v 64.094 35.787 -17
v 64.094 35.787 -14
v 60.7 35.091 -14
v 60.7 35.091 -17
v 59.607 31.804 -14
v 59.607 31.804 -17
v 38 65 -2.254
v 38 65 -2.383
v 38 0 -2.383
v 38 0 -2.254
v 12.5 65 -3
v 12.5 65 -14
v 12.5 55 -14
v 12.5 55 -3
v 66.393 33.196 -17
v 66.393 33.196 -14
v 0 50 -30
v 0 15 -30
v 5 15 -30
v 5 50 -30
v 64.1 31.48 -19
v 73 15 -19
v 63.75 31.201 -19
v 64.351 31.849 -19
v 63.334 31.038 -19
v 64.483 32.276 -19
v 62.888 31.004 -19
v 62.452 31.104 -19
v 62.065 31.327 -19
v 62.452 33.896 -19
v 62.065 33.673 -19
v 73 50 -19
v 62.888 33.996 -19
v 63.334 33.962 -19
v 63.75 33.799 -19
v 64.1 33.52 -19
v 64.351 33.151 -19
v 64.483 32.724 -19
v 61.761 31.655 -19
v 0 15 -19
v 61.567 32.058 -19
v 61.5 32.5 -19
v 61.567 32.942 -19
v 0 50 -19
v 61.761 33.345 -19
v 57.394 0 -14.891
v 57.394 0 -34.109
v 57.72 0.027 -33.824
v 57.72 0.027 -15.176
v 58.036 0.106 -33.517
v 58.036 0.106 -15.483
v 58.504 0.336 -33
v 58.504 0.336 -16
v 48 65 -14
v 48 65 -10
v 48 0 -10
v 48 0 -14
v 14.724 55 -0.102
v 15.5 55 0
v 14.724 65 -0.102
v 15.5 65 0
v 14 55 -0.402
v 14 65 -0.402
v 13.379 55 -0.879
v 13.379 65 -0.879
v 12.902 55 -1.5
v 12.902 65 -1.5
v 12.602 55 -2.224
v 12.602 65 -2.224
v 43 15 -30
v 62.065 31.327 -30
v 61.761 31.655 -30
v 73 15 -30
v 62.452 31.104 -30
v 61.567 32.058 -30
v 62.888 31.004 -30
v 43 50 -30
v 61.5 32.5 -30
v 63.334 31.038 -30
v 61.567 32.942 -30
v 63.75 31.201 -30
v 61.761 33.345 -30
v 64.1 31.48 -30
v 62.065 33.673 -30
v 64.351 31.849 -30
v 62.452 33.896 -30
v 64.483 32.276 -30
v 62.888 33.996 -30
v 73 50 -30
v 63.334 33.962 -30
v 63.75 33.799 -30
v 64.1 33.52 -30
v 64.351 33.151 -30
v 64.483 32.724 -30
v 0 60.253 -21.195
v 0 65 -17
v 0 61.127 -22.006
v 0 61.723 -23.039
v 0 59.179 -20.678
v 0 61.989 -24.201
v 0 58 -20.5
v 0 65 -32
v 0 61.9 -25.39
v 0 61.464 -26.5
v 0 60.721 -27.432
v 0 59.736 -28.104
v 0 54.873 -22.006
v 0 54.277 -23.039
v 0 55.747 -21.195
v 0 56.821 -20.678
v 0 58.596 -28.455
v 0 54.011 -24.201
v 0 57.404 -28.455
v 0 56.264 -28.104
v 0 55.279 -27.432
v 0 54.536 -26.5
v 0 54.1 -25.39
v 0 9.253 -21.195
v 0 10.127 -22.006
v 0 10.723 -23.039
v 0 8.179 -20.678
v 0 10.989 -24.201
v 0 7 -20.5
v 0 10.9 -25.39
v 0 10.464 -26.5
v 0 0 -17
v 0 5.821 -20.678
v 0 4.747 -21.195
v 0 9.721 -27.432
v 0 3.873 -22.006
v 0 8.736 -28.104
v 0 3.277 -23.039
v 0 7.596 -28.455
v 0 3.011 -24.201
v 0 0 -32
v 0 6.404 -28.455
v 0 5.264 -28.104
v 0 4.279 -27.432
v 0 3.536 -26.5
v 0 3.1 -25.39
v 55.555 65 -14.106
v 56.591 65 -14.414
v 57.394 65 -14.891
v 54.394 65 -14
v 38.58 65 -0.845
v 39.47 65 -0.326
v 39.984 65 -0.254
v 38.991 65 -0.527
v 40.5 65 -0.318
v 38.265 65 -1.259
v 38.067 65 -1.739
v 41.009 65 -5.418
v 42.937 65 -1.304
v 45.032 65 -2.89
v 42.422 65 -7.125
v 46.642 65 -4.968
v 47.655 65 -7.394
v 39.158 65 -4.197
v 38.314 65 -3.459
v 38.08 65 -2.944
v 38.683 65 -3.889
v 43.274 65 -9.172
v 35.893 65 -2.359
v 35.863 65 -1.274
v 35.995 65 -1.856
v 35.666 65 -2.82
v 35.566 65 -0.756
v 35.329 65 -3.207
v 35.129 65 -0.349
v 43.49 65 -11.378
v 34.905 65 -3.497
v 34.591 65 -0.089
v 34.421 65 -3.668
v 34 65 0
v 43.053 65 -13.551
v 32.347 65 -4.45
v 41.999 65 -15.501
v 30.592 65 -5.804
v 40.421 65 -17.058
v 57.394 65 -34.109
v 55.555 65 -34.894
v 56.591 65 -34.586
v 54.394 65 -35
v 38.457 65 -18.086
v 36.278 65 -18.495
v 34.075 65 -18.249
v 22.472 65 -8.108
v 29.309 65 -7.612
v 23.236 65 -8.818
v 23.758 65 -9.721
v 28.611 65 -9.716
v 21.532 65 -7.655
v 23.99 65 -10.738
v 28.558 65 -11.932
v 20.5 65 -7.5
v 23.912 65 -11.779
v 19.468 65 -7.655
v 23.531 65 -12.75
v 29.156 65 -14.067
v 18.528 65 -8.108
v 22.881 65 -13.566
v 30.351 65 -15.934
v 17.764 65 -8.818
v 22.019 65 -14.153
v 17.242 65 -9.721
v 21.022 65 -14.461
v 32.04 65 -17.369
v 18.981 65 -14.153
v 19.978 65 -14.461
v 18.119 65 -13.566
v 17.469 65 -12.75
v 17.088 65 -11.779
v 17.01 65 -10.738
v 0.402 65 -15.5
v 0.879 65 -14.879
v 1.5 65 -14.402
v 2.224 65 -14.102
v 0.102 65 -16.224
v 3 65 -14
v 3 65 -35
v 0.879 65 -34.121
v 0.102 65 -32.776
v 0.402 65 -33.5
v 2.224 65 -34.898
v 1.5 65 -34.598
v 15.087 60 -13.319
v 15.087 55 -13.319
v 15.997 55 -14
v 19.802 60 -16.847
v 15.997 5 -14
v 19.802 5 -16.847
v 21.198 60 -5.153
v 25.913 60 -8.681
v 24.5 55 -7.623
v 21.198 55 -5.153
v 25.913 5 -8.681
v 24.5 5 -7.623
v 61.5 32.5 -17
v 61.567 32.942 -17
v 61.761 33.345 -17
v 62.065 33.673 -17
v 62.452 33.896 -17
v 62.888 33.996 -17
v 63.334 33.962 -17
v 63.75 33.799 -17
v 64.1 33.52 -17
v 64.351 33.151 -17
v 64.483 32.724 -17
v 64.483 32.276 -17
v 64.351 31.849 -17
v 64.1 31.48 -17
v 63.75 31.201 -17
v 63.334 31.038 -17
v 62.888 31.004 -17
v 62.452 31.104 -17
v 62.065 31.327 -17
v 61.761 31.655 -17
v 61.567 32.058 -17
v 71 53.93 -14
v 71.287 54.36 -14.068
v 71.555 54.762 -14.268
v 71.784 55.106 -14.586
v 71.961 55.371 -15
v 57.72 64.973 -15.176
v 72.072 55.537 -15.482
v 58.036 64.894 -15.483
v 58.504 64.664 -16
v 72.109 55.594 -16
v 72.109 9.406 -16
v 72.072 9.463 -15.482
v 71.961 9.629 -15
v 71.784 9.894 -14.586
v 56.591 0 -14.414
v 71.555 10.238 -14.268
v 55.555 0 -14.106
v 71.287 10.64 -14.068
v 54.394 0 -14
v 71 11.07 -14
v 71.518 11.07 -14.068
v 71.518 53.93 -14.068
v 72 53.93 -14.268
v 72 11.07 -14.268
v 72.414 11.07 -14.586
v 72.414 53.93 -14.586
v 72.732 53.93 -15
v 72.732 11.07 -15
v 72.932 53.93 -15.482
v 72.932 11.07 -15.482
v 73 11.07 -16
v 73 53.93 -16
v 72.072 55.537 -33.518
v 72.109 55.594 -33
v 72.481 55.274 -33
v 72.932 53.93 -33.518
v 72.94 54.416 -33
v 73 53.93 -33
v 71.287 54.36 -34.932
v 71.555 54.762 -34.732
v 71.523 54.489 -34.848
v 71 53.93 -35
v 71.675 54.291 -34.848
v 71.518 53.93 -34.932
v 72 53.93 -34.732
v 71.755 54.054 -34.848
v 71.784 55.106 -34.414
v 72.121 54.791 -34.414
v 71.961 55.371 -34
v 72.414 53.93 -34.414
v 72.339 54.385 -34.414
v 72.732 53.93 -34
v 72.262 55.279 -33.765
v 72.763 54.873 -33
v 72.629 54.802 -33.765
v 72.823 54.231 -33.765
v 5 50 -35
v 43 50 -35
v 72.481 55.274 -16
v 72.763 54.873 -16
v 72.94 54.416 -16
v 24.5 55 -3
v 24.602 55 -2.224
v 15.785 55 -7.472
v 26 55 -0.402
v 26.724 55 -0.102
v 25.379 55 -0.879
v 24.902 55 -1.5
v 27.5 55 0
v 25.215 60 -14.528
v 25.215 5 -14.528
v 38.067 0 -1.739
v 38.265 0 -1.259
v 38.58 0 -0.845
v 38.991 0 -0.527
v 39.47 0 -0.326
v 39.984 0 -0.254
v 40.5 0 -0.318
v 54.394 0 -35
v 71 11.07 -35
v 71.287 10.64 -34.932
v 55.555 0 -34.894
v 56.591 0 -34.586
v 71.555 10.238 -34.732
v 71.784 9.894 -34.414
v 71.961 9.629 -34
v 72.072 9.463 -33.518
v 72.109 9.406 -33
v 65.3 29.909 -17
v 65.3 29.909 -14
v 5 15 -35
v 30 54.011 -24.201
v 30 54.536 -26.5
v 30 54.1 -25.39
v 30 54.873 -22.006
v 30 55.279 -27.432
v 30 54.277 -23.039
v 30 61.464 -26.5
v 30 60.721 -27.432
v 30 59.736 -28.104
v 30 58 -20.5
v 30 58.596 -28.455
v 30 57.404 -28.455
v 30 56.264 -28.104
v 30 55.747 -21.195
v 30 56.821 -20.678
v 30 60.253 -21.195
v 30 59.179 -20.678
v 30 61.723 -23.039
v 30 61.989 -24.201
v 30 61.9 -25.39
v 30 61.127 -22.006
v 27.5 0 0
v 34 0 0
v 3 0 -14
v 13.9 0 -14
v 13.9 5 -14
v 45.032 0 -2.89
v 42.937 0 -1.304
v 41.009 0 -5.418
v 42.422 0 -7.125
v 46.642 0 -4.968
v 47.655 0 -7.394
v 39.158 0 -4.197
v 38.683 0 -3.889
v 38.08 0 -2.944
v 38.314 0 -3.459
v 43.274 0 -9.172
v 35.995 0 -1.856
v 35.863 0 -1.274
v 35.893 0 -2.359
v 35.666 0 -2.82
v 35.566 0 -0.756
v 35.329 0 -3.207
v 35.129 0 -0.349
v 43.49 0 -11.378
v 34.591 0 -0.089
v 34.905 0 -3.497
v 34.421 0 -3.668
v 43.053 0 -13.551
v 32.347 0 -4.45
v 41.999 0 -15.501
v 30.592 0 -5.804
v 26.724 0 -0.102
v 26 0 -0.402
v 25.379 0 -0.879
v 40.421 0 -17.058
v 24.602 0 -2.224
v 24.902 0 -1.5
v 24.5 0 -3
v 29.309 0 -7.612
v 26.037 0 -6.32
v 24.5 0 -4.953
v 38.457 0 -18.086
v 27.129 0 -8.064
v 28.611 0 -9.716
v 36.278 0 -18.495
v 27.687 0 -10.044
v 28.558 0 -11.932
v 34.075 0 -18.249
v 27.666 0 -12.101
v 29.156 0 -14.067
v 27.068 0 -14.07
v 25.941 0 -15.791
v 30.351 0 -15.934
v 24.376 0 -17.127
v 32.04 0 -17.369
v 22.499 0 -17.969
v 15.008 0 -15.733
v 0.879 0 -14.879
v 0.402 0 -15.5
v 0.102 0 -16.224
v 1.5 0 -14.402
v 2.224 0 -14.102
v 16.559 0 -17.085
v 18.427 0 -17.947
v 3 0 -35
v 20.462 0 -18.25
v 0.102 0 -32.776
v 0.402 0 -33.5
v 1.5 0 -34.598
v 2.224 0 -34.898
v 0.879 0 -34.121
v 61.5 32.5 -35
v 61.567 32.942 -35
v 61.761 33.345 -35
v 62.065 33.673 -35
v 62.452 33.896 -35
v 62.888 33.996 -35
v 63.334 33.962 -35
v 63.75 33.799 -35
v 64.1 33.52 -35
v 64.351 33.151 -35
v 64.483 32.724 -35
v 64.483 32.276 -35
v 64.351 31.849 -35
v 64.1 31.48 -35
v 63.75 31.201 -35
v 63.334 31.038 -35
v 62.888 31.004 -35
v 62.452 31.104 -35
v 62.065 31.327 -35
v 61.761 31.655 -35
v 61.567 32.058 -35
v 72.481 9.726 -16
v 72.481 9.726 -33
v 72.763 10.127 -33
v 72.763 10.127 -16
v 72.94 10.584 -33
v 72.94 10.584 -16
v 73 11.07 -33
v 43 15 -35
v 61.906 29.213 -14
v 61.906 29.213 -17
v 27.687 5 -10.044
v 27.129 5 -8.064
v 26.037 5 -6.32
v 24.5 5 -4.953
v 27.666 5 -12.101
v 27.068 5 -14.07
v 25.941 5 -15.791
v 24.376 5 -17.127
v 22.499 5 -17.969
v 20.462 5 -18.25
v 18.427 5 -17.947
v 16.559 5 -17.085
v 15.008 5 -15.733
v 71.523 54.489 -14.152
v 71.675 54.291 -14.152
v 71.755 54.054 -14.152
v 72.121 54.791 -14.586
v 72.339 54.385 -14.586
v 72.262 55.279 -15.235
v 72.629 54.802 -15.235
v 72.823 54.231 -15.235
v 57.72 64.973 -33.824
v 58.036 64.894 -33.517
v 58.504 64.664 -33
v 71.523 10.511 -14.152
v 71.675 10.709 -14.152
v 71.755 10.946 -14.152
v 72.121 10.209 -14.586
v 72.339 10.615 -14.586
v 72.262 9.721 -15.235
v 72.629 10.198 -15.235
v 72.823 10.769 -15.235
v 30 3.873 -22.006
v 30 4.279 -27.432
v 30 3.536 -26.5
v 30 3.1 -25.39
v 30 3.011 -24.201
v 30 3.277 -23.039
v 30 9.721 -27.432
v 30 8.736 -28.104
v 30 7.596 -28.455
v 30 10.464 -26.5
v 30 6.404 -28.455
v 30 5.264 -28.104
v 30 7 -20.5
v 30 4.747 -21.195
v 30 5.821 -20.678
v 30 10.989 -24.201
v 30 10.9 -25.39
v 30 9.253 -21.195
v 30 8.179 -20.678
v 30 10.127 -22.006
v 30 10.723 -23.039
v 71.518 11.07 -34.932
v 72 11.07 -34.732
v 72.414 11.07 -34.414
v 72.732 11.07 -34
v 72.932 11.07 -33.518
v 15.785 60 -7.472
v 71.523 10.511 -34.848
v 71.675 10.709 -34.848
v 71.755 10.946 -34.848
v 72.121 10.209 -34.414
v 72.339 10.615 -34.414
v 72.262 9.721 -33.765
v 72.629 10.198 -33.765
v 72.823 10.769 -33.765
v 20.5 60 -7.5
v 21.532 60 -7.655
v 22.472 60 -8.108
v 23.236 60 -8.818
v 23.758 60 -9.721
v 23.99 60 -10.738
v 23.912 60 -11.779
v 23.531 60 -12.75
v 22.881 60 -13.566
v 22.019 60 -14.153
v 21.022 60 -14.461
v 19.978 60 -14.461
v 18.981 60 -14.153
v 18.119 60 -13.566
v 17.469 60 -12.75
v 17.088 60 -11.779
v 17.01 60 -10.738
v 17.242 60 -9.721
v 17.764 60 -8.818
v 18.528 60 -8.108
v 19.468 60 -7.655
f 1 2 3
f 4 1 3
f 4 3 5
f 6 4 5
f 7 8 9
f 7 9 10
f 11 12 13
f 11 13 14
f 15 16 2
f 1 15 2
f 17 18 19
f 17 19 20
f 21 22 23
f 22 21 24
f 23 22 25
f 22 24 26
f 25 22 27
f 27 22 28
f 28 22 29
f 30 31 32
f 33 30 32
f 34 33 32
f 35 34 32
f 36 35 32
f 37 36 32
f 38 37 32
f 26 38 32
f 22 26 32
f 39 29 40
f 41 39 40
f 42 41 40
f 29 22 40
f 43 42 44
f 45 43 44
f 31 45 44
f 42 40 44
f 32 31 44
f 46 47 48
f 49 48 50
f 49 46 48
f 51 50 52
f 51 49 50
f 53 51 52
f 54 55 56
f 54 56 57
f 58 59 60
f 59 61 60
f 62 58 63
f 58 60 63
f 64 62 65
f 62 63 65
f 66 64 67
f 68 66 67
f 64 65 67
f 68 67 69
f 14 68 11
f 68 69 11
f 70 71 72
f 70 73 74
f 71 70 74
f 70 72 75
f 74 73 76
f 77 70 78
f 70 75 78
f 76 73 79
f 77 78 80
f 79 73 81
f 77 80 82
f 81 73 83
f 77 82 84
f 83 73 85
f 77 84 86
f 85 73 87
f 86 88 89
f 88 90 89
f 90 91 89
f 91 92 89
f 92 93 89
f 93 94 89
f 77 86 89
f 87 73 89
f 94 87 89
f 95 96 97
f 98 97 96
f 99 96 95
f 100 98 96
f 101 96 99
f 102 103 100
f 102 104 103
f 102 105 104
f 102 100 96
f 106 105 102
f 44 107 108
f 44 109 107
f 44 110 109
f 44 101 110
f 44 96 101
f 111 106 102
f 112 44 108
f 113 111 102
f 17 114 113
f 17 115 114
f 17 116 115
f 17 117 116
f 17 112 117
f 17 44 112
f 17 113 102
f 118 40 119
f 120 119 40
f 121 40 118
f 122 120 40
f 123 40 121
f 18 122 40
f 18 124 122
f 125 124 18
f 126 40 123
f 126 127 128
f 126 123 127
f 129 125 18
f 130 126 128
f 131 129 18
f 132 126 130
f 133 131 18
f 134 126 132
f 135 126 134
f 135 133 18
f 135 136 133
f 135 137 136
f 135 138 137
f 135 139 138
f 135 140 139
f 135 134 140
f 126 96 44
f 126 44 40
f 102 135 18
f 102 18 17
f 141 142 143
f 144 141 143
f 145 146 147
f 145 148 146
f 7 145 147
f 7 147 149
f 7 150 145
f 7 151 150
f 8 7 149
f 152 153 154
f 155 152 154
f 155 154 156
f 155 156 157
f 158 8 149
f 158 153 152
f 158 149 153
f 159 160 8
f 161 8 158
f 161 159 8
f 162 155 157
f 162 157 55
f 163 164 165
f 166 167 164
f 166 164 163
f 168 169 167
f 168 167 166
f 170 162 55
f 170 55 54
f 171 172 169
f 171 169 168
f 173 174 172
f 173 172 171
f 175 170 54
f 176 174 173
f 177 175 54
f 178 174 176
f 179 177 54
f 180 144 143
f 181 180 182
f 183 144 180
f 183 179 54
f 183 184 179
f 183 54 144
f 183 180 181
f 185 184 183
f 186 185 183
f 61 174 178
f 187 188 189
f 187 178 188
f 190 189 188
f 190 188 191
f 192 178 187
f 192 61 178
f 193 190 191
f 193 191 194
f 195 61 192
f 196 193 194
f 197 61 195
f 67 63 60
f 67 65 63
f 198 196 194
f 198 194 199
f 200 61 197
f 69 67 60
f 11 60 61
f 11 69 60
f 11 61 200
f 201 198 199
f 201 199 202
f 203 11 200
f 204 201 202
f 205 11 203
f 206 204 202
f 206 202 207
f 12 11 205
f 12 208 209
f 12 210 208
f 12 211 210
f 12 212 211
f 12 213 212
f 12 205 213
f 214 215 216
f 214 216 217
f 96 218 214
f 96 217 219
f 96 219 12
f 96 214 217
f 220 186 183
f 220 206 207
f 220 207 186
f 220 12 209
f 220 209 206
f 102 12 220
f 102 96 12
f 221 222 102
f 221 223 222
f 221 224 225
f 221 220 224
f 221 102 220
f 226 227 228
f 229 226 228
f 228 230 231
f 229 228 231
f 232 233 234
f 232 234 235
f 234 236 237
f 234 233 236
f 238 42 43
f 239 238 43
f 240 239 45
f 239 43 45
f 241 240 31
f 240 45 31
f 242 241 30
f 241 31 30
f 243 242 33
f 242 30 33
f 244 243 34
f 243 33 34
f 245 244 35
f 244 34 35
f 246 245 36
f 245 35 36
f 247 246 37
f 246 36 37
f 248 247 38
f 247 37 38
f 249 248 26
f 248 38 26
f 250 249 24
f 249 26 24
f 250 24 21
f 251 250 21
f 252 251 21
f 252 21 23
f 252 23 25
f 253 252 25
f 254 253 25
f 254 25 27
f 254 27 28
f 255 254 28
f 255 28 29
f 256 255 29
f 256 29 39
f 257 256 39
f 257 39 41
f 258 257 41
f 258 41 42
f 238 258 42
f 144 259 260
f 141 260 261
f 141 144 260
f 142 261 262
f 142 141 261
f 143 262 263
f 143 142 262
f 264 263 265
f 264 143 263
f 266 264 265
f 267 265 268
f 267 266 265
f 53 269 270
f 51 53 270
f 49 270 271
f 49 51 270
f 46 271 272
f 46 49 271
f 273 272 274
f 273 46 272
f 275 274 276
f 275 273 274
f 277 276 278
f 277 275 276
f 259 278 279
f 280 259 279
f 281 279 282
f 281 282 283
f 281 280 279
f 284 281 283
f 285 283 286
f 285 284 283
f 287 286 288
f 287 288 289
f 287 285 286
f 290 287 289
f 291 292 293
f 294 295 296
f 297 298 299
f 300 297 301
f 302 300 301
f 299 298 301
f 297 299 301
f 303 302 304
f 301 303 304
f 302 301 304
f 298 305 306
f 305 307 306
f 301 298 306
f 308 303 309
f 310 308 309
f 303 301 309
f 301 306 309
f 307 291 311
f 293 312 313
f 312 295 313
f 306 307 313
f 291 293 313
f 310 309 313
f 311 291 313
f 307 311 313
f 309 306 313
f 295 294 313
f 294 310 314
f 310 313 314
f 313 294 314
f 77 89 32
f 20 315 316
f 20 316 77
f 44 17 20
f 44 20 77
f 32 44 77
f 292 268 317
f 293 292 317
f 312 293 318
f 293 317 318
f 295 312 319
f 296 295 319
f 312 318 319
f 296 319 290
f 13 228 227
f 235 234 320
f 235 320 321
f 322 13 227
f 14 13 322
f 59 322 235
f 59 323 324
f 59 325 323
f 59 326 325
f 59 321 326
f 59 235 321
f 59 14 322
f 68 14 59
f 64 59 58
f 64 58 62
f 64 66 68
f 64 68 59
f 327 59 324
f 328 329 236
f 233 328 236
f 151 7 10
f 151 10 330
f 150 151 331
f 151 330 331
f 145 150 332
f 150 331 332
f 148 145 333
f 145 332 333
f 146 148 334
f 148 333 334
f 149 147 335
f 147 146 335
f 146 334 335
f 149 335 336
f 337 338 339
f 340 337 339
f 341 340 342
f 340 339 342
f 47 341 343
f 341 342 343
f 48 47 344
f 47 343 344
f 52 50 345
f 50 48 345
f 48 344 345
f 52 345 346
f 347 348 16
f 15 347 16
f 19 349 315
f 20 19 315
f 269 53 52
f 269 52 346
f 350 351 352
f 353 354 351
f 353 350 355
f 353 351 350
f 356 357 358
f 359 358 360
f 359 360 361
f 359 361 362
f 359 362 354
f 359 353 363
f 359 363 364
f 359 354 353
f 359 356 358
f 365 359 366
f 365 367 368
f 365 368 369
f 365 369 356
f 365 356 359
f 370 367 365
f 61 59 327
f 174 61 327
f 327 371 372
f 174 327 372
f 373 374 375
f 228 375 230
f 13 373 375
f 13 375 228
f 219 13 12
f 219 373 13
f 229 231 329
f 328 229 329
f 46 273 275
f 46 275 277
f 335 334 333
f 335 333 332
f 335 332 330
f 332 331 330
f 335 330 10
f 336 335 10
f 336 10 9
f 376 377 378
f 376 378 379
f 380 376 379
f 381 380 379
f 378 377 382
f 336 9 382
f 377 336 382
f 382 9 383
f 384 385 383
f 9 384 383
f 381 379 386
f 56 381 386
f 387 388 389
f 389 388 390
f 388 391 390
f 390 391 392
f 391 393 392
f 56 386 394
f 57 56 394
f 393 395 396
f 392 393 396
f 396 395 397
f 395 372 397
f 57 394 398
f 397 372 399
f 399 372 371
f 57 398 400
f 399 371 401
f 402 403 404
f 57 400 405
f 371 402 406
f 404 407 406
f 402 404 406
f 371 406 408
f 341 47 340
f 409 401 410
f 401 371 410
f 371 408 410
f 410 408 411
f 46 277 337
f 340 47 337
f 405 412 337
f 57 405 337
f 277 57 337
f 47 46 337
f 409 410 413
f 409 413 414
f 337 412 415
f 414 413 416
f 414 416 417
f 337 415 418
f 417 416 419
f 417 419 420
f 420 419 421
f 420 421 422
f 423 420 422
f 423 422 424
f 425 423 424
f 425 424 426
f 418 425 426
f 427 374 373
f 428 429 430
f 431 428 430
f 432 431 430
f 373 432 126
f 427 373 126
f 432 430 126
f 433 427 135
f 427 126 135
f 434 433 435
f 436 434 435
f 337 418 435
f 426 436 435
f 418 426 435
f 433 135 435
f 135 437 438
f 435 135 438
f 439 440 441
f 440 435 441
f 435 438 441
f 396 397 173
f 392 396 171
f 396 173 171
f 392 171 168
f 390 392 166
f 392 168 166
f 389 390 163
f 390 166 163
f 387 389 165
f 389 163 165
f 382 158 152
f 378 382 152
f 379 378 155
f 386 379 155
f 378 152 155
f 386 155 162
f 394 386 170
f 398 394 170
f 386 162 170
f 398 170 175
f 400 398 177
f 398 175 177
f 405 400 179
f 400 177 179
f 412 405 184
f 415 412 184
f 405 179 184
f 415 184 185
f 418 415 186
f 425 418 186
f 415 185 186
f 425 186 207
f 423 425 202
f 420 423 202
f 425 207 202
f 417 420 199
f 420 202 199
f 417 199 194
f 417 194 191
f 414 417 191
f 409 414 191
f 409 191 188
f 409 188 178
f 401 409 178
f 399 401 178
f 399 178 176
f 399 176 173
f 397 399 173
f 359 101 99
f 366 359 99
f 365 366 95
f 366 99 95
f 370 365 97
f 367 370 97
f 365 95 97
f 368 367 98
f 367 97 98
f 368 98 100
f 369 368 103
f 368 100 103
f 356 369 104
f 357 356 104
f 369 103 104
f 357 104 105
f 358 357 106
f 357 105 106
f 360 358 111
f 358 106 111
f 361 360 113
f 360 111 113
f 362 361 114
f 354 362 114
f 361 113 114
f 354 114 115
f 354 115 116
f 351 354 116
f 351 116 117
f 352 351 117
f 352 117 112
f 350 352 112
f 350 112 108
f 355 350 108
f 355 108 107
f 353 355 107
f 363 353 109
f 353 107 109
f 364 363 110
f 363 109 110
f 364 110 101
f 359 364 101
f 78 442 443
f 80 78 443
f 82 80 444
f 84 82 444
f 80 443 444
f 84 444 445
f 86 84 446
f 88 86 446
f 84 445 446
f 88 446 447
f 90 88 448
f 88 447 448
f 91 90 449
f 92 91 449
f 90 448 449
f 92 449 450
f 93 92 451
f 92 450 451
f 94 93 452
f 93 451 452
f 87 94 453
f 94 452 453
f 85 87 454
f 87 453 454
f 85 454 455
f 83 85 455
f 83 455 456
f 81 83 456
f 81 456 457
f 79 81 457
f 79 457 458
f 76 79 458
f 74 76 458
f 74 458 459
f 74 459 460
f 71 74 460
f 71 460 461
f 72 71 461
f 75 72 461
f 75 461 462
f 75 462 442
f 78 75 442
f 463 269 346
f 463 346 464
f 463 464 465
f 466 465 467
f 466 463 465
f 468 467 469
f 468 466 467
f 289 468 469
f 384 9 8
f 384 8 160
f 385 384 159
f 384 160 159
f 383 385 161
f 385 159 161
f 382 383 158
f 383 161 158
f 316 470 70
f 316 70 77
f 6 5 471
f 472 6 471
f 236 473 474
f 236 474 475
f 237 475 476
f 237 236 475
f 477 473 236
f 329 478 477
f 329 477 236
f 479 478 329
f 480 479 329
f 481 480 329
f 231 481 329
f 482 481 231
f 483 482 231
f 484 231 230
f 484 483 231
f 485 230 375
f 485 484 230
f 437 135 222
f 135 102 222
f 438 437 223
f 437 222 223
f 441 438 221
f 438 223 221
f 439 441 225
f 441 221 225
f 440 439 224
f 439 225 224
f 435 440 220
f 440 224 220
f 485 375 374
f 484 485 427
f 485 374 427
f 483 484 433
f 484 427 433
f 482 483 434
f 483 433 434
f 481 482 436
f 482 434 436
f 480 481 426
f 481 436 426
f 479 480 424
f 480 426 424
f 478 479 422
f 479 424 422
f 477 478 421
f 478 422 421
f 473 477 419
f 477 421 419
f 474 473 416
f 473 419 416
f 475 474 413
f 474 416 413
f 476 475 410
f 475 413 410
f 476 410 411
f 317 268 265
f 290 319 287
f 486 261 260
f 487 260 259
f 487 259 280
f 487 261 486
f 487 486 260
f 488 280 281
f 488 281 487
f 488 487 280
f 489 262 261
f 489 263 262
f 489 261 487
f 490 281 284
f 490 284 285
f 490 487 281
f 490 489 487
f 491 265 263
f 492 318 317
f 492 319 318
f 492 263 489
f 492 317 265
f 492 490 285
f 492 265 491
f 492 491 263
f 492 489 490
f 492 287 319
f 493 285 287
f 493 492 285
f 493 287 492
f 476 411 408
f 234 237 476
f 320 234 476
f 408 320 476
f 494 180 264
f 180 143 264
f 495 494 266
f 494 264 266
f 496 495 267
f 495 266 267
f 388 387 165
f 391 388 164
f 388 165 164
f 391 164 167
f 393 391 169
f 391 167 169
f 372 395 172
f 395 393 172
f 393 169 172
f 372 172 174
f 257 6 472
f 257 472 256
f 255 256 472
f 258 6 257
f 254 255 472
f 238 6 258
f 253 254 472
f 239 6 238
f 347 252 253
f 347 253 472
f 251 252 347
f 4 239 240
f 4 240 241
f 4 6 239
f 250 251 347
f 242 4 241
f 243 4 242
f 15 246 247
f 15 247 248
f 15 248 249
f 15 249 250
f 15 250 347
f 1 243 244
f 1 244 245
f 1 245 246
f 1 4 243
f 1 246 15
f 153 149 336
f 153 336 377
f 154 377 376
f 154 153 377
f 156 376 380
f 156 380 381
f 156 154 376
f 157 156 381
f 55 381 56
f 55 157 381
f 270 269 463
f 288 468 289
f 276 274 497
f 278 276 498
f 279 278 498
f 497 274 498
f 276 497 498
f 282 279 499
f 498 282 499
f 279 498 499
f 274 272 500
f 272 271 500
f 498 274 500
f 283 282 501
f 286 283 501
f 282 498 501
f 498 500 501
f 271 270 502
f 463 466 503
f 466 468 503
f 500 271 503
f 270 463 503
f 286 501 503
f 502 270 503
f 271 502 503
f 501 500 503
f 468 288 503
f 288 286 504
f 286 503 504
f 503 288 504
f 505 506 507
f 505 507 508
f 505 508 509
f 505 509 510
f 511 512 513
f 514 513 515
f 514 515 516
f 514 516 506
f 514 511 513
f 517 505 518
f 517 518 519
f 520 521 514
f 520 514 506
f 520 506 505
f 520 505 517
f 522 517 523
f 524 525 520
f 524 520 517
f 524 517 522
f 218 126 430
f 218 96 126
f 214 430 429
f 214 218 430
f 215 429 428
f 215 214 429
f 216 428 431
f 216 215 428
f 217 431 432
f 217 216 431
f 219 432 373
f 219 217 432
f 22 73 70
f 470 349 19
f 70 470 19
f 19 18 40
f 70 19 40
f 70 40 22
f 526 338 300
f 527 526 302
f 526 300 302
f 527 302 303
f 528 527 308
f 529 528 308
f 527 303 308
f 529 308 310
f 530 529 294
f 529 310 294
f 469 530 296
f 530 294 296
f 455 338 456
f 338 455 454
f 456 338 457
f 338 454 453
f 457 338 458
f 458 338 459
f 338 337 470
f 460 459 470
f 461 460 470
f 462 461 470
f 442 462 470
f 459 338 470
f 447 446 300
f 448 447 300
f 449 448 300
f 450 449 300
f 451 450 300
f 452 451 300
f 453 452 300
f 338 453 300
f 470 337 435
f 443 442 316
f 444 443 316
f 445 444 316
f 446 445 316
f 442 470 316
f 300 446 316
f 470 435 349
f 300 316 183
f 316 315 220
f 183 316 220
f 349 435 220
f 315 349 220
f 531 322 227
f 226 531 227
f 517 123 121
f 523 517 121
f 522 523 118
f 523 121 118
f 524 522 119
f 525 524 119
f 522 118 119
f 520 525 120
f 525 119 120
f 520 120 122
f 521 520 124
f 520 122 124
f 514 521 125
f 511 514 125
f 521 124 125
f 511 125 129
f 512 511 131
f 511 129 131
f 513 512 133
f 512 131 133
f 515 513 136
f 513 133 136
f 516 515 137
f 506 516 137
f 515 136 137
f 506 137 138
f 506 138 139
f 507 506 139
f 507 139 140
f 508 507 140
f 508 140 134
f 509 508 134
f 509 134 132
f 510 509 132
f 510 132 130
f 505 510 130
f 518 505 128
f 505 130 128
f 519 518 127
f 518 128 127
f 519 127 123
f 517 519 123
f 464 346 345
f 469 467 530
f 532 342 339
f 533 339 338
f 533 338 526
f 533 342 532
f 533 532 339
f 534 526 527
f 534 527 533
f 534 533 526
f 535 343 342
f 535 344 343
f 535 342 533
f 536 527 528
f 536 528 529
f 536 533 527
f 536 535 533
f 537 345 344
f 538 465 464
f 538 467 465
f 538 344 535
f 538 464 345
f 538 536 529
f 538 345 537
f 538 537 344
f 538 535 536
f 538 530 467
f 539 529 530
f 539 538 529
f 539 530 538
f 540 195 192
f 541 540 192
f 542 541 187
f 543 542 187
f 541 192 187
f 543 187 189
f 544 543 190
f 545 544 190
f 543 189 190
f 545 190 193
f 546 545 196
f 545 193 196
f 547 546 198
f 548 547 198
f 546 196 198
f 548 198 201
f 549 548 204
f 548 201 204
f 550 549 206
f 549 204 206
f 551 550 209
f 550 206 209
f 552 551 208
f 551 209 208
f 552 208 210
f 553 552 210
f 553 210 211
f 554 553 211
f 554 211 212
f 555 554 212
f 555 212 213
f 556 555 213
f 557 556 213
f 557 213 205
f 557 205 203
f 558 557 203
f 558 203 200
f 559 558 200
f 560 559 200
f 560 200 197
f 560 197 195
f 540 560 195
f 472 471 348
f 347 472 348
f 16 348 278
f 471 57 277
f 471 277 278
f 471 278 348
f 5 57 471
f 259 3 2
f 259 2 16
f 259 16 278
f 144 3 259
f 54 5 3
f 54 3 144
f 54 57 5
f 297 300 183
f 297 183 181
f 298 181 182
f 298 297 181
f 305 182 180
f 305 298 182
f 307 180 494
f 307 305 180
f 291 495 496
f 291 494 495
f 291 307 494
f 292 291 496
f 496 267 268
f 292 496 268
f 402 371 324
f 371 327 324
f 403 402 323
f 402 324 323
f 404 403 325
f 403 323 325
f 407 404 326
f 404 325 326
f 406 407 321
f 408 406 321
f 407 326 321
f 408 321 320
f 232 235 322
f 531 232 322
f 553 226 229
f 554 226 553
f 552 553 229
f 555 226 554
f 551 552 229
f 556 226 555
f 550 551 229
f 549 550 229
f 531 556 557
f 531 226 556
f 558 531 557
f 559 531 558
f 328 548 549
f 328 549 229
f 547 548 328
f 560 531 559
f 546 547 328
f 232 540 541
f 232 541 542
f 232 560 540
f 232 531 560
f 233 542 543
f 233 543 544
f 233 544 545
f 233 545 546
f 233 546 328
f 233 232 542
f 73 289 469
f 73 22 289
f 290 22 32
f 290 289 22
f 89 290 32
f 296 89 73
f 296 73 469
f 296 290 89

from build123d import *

# Parameters (mm, degrees)
SKETCH1_W           = 48
SKETCH1_H           = 35
BOSS_EXTRUDE1_DEPTH = 65
SKETCH2_R           = 7.5
SKETCH2_R_2         = 3.5
CUT_EXTRUDE1_DEPTH  = 89.056799851
SKETCH3_W           = 14
SKETCH3_H           = 65
CUT_EXTRUDE2_DEPTH  = 12.5
SKETCH4_W           = 14
SKETCH4_H           = 55
CUT_EXTRUDE3_DEPTH  = 12
CUT_EXTRUDE4_DEPTH  = 60
SKETCH6_R           = 7.25
CUT_EXTRUDE5_DEPTH  = 5
SKETCH7_W           = 11
SKETCH7_H           = 35
CUT_EXTRUDE6_DEPTH  = 89.056799851
SKETCH8_R           = 4
CUT_EXTRUDE7_DEPTH  = 30
SKETCH9_W           = 38
SKETCH9_H           = 35
CUT_EXTRUDE8_DEPTH  = 10
FILLET1_R           = 3
SKETCH11_W          = 21
SKETCH11_H          = 65
BOSS_EXTRUDE2_DEPTH = 25
FILLET2_R           = 10
CUT_EXTRUDE9_DEPTH  = 104.821962994
FILLET3_R           = 2
SKETCH13_W          = 11
SKETCH13_H          = 35
CUT_EXTRUDE10_DEPTH = 104.821962994
CUT_EXTRUDE11_DEPTH = 104.821962994
SKETCH16_R          = 1.5
CUT_EXTRUDE13_DEPTH = 104.821962994
CUT_EXTRUDE14_DEPTH = 3
FILLET4_R           = 2


with BuildPart() as part:
    # Sketch1 → Boss-Extrude1 (new body)
    with BuildSketch(Plane(origin=(0, 0, 0), x_dir=(1, 0, 0), z_dir=(0, 1, 0))):
        with Locations((24, 17.5)):
            Rectangle(SKETCH1_W, SKETCH1_H)
    extrude(amount=BOSS_EXTRUDE1_DEPTH)

    # Sketch2 → Cut-Extrude1 (cut, through all)
    with BuildSketch(Plane(origin=(0, 65, 0), x_dir=(1, 0, 0), z_dir=(0, 1, 0))):
        with Locations(Location((36, 11, 0), (0, 0, 270))):
            Circle(SKETCH2_R)
        with Locations(Location((20.5, 11, 0), (0, 0, 270))):
            Circle(SKETCH2_R_2)
    extrude(amount=-CUT_EXTRUDE1_DEPTH, mode=Mode.SUBTRACT)

    # Sketch3 → Cut-Extrude2 (cut)
    with BuildSketch(Plane.ZY):
        with Locations((-7, 32.5)):
            Rectangle(SKETCH3_W, SKETCH3_H)
    extrude(amount=-CUT_EXTRUDE2_DEPTH, mode=Mode.SUBTRACT)

    # Sketch4 → Cut-Extrude3 (cut)
    with BuildSketch(Plane.ZY.offset(-12.5)):
        with Locations((-7, 27.5)):
            Rectangle(SKETCH4_W, SKETCH4_H)
    extrude(amount=-CUT_EXTRUDE3_DEPTH, mode=Mode.SUBTRACT)

    # Sketch5 → Cut-Extrude4 (cut)
    with BuildSketch(Plane.XZ):
        Polygon((25.215019923, -14.528255535), (25.913068886, -8.680800735), (21.198048963, -5.152545199), (15.784980077, -7.471744465), (15.086931114, -13.319199265), (19.801951037, -16.847454801), align=None)
    extrude(amount=-CUT_EXTRUDE4_DEPTH, mode=Mode.SUBTRACT)

    # Sketch6 → Cut-Extrude5 (cut)
    with BuildSketch(Plane(origin=(0, 0, 0), x_dir=(-1, 0, 0), z_dir=(0, -1, 0))):
        with Locations((-20.5, 11)):
            Circle(SKETCH6_R)
    extrude(amount=-CUT_EXTRUDE5_DEPTH, mode=Mode.SUBTRACT)

    # Sketch7 → Cut-Extrude6 (cut, through all)
    with BuildSketch(Plane.ZY):
        with Locations((-24.5, 32.5)):
            Rectangle(SKETCH7_W, SKETCH7_H)
    extrude(amount=-CUT_EXTRUDE6_DEPTH, mode=Mode.SUBTRACT)

    # Sketch8 → Cut-Extrude7 (cut)
    with BuildSketch(Plane.ZY):
        with Locations((-24.5, 58)):
            Circle(SKETCH8_R)
        with Locations((-24.5, 7)):
            Circle(SKETCH8_R)
    extrude(amount=-CUT_EXTRUDE7_DEPTH, mode=Mode.SUBTRACT)

    # Sketch9 → Cut-Extrude8 (cut)
    with BuildSketch(Plane(origin=(0, 0, -35), x_dir=(-1, 0, 0), z_dir=(0, 0, -1))):
        with Locations((-24, 32.5)):
            Rectangle(SKETCH9_W, SKETCH9_H)
    extrude(amount=-CUT_EXTRUDE8_DEPTH, mode=Mode.SUBTRACT)

    # Fillet1
    fillet1_edges = [part.edges().sort_by_distance(p)[0] for p in [
        (0, 32.5, -14),
        (12.5, 60, 0),
        (24.5, 27.5, 0),
        (0, 32.5, -35),
    ]]
    fillet(fillet1_edges, radius=FILLET1_R)

    # Sketch11 → Boss-Extrude2 (add)
    with BuildSketch(Plane(origin=(48, 0, 0), x_dir=(0, 0, -1), z_dir=(1, 0, 0))):
        with Locations((24.5, 32.5)):
            Rectangle(SKETCH11_W, SKETCH11_H)
    extrude(amount=BOSS_EXTRUDE2_DEPTH)

    # Fillet2
    fillet2_edges = [part.edges().sort_by_distance(p)[0] for p in [
        (48, 32.5, 0),
    ]]
    fillet(fillet2_edges, radius=FILLET2_R)

    # Sketch12 → Cut-Extrude9 (cut, through all)
    with BuildSketch(Plane(origin=(0, 65, 0), x_dir=(1, 0, 0), z_dir=(0, 1, 0))):
        Polygon((36, 0), (36, 3.5), (38, 3.771583853), (38, 0), align=None)
    extrude(amount=-CUT_EXTRUDE9_DEPTH, mode=Mode.SUBTRACT)

    # Fillet3
    # the kernel refuses this fillet: 2 mm, written as the material it takes off along each edge
    with BuildSketch(Plane(origin=(38, -6.300214624, 0), x_dir=(0.9920296962671666, 0, -0.12600429248272813), z_dir=(0, 1, 0))) as fillet3_piece_1:
        with BuildLine():
            CenterArc((2.268077265, 1.984059393), FILLET3_R, 172.761243907, 104.477512186)
            Line((0.284017872, 2.236067977), (0, 0))
            ThreePointArc((0, 0), (1.260042925, -0.079703037), (2.52008585, 0))
        make_face()
    extrude(amount=77.600429248, mode=Mode.SUBTRACT)
    with BuildSketch(Plane(origin=(36, 70, 0), x_dir=(-1, 0, 0), z_dir=(0, -1, 0))) as fillet3_piece_2:
        with BuildLine():
            CenterArc((FILLET3_R, FILLET3_R), FILLET3_R, 180, 90)
            Line((0, FILLET3_R), (0, 0))
            Line((0, 0), (FILLET3_R, 0))
        make_face()
    extrude(amount=75, mode=Mode.SUBTRACT)
    with BuildSketch(Plane(origin=(36, 69.467719526, -3.5), x_dir=(0, 0, 1), z_dir=(0, -1, 0))) as fillet3_piece_3:
        with BuildLine():
            CenterArc((1.787087811, 2), FILLET3_R, 192.153197469, 77.846802531)
            ThreePointArc((-0.168088571, 1.578947368), (-0.042140531, 0.793934594), (0, 0))
            Line((0, 0), (1.787087811, 0))
        make_face()
    extrude(amount=73.935439053, mode=Mode.SUBTRACT)
    with BuildSketch(Plane(origin=(38, 68.471069556, -3.771583853), x_dir=(0, 0, 1), z_dir=(0, -1, 0))) as fillet3_piece_4:
        with BuildLine():
            CenterArc((1.388427822, -2), FILLET3_R, 90, 65.09893763)
            ThreePointArc((-0.425644592, -1.157894737), (-0.188974611, -0.587713829), (0, 0))
            Line((0, 0), (1.388427822, 0))
        make_face()
    extrude(amount=71.942139112, mode=Mode.SUBTRACT)

    # Sketch13 → Cut-Extrude10 (cut, through all)
    with BuildSketch(Plane(origin=(73, 0, 0), x_dir=(0, 0, -1), z_dir=(1, 0, 0))):
        with Locations((24.5, 32.5)):
            Rectangle(SKETCH13_W, SKETCH13_H)
    extrude(amount=-CUT_EXTRUDE10_DEPTH, mode=Mode.SUBTRACT)

    # Sketch14 → Cut-Extrude11 (cut, through all)
    with BuildSketch(Plane(origin=(0, 0, -35), x_dir=(-1, 0, 0), z_dir=(0, 0, -1))):
        Polygon((-73, 65), (-58, 65), (-73, 55), align=None)
        Polygon((-73, 0), (-58, 0), (-73, 10), align=None)
    extrude(amount=-CUT_EXTRUDE11_DEPTH, mode=Mode.SUBTRACT)

    # Sketch16 → Cut-Extrude13 (cut, through all)
    with BuildSketch(Plane(origin=(0, 0, -35), x_dir=(-1, 0, 0), z_dir=(0, 0, -1))):
        with Locations((-63, 32.5)):
            Circle(SKETCH16_R)
    extrude(amount=-CUT_EXTRUDE13_DEPTH, mode=Mode.SUBTRACT)

    # Sketch17 → Cut-Extrude14 (cut)
    with BuildSketch(Plane.XY.offset(-14)):
        Polygon((60.700217219, 35.090559623), (59.606618166, 31.8036095), (61.906400947, 29.213049877), (65.299782781, 29.909440377), (66.393381834, 33.1963905), (64.093599053, 35.786950123), align=None)
    extrude(amount=-CUT_EXTRUDE14_DEPTH, mode=Mode.SUBTRACT)

    # Fillet4
    fillet4_edges = [part.edges().sort_by_distance(p)[0] for p in [
        (65.5, 5, -35),
        (65.5, 5, -14),
        (65.5, 60, -35),
        (65.5, 60, -14),
        (73, 32.5, -14),
        (73, 32.5, -35),
        (58, 0, -24.5),
        (73, 10, -24.5),
        (73, 55, -24.5),
        (58, 65, -24.5),
    ]]
    fillet(fillet4_edges, radius=FILLET4_R)


solid = part.part
